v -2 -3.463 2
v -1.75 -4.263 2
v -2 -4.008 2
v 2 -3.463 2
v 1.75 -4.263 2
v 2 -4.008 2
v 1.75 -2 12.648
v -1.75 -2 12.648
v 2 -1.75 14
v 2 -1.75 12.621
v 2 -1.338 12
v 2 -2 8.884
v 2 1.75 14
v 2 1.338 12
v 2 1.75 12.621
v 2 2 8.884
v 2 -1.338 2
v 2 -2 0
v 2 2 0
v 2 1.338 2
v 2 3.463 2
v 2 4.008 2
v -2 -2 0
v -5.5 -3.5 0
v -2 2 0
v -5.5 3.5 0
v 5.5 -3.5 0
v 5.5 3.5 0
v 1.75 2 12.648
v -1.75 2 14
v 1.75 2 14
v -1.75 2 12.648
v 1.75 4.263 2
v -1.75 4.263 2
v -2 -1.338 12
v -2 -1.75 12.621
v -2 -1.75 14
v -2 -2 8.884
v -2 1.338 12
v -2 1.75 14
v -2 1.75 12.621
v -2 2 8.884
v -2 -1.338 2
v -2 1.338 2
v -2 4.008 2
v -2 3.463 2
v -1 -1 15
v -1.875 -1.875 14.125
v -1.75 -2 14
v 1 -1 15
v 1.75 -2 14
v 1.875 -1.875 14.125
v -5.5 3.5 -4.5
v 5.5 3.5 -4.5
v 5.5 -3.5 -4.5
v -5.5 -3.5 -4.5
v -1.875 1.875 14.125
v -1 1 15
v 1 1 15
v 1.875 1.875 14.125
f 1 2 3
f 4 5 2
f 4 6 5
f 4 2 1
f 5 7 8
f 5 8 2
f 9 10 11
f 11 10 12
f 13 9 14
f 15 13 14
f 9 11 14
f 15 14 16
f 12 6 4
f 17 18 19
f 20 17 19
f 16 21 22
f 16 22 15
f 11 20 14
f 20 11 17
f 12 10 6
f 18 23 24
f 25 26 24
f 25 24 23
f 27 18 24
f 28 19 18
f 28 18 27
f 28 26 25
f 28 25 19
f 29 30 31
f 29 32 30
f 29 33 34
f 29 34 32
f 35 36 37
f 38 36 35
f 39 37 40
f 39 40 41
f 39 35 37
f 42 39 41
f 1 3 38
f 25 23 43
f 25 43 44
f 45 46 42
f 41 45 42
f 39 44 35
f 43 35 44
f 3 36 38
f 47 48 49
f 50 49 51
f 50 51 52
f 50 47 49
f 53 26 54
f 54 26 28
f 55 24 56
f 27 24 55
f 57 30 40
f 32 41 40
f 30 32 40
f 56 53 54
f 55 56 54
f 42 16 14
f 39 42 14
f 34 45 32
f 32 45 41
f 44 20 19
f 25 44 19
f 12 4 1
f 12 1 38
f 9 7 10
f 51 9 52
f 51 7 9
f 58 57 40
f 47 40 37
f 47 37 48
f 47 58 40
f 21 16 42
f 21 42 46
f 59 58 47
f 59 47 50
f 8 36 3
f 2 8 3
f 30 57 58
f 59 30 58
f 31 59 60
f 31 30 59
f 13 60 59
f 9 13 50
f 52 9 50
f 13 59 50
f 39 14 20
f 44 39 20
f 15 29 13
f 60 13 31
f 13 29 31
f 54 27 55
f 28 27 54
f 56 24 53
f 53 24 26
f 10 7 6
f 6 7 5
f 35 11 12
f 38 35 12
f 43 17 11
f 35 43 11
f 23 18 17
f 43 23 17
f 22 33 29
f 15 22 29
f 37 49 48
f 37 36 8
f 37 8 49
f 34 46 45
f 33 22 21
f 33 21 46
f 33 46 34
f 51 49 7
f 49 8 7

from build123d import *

# Parameters (mm, degrees)
F0_W     = 11
F0_H     = 7
F1_DEPTH = 4.5
F2_W     = 4
F2_H     = 4
F3_DEPTH = 15
F5_DEPTH = 4
F7_DEPTH = 25
F8_SIZE  = 1
F9_SIZE  = 0.25


with BuildPart() as f1:
    # F0 (on Top) → F1 (new body)
    with BuildSketch(Plane.XY):
        Rectangle(F0_W, F0_H)
    extrude(amount=-F1_DEPTH)

    # F2 (on face) → F3 (join)
    with BuildSketch(Plane.XY):
        Rectangle(F2_W, F2_H)
    extrude(amount=F3_DEPTH)

    # F4 (on face) → F5 (join)
    with BuildSketch(Plane.YZ.offset(2)):
        Polygon((-1.137265, 12.942829), (-1.5, 15), (-4.263235, 2), (-3.463235, 2), align=None)
        Polygon((3.463235, 2), (4.263235, 2), (1.5, 15), (1.137265, 12.942829), align=None)
    extrude(amount=-F5_DEPTH)

    # F6 (on face) → F7 (cut)
    with BuildSketch(Plane.YZ.offset(2)):
        Polygon((-1.33767, 12), (-2, 8.883981), (-2, 2), (-1.33767, 2), align=None)
        Polygon((-1.33767, 2), (-2, 2), (-2, 0), align=None)
        Polygon((2, 2), (2, 8.883981), (1.33767, 12), (1.33767, 2), align=None)
        Polygon((2, 0), (2, 2), (1.33767, 2), align=None)
    extrude(amount=-F7_DEPTH, mode=Mode.SUBTRACT)

    # F8
    f8_edges = [f1.edges().sort_by_distance(p)[0] for p in [
        (-2, 0, 15),
        (0, 2, 15),
        (2, 0, 15),
        (0, -2, 15),
    ]]
    chamfer(f8_edges, length=F8_SIZE)

    # F9
    f9_edges = [f1.edges().sort_by_distance(p)[0] for p in [
        (2, -2, 13.323842),
        (2, -3.131618, 7.323842),
        (-2, -3.131618, 7.323842),
        (-2, -2, 13.323842),
        (-2, 3.131618, 7.323842),
        (-2, 2, 13.323842),
        (2, 2, 13.323842),
        (2, 3.131618, 7.323842),
    ]]
    chamfer(f9_edges, length=F9_SIZE)


solid = f1.part
